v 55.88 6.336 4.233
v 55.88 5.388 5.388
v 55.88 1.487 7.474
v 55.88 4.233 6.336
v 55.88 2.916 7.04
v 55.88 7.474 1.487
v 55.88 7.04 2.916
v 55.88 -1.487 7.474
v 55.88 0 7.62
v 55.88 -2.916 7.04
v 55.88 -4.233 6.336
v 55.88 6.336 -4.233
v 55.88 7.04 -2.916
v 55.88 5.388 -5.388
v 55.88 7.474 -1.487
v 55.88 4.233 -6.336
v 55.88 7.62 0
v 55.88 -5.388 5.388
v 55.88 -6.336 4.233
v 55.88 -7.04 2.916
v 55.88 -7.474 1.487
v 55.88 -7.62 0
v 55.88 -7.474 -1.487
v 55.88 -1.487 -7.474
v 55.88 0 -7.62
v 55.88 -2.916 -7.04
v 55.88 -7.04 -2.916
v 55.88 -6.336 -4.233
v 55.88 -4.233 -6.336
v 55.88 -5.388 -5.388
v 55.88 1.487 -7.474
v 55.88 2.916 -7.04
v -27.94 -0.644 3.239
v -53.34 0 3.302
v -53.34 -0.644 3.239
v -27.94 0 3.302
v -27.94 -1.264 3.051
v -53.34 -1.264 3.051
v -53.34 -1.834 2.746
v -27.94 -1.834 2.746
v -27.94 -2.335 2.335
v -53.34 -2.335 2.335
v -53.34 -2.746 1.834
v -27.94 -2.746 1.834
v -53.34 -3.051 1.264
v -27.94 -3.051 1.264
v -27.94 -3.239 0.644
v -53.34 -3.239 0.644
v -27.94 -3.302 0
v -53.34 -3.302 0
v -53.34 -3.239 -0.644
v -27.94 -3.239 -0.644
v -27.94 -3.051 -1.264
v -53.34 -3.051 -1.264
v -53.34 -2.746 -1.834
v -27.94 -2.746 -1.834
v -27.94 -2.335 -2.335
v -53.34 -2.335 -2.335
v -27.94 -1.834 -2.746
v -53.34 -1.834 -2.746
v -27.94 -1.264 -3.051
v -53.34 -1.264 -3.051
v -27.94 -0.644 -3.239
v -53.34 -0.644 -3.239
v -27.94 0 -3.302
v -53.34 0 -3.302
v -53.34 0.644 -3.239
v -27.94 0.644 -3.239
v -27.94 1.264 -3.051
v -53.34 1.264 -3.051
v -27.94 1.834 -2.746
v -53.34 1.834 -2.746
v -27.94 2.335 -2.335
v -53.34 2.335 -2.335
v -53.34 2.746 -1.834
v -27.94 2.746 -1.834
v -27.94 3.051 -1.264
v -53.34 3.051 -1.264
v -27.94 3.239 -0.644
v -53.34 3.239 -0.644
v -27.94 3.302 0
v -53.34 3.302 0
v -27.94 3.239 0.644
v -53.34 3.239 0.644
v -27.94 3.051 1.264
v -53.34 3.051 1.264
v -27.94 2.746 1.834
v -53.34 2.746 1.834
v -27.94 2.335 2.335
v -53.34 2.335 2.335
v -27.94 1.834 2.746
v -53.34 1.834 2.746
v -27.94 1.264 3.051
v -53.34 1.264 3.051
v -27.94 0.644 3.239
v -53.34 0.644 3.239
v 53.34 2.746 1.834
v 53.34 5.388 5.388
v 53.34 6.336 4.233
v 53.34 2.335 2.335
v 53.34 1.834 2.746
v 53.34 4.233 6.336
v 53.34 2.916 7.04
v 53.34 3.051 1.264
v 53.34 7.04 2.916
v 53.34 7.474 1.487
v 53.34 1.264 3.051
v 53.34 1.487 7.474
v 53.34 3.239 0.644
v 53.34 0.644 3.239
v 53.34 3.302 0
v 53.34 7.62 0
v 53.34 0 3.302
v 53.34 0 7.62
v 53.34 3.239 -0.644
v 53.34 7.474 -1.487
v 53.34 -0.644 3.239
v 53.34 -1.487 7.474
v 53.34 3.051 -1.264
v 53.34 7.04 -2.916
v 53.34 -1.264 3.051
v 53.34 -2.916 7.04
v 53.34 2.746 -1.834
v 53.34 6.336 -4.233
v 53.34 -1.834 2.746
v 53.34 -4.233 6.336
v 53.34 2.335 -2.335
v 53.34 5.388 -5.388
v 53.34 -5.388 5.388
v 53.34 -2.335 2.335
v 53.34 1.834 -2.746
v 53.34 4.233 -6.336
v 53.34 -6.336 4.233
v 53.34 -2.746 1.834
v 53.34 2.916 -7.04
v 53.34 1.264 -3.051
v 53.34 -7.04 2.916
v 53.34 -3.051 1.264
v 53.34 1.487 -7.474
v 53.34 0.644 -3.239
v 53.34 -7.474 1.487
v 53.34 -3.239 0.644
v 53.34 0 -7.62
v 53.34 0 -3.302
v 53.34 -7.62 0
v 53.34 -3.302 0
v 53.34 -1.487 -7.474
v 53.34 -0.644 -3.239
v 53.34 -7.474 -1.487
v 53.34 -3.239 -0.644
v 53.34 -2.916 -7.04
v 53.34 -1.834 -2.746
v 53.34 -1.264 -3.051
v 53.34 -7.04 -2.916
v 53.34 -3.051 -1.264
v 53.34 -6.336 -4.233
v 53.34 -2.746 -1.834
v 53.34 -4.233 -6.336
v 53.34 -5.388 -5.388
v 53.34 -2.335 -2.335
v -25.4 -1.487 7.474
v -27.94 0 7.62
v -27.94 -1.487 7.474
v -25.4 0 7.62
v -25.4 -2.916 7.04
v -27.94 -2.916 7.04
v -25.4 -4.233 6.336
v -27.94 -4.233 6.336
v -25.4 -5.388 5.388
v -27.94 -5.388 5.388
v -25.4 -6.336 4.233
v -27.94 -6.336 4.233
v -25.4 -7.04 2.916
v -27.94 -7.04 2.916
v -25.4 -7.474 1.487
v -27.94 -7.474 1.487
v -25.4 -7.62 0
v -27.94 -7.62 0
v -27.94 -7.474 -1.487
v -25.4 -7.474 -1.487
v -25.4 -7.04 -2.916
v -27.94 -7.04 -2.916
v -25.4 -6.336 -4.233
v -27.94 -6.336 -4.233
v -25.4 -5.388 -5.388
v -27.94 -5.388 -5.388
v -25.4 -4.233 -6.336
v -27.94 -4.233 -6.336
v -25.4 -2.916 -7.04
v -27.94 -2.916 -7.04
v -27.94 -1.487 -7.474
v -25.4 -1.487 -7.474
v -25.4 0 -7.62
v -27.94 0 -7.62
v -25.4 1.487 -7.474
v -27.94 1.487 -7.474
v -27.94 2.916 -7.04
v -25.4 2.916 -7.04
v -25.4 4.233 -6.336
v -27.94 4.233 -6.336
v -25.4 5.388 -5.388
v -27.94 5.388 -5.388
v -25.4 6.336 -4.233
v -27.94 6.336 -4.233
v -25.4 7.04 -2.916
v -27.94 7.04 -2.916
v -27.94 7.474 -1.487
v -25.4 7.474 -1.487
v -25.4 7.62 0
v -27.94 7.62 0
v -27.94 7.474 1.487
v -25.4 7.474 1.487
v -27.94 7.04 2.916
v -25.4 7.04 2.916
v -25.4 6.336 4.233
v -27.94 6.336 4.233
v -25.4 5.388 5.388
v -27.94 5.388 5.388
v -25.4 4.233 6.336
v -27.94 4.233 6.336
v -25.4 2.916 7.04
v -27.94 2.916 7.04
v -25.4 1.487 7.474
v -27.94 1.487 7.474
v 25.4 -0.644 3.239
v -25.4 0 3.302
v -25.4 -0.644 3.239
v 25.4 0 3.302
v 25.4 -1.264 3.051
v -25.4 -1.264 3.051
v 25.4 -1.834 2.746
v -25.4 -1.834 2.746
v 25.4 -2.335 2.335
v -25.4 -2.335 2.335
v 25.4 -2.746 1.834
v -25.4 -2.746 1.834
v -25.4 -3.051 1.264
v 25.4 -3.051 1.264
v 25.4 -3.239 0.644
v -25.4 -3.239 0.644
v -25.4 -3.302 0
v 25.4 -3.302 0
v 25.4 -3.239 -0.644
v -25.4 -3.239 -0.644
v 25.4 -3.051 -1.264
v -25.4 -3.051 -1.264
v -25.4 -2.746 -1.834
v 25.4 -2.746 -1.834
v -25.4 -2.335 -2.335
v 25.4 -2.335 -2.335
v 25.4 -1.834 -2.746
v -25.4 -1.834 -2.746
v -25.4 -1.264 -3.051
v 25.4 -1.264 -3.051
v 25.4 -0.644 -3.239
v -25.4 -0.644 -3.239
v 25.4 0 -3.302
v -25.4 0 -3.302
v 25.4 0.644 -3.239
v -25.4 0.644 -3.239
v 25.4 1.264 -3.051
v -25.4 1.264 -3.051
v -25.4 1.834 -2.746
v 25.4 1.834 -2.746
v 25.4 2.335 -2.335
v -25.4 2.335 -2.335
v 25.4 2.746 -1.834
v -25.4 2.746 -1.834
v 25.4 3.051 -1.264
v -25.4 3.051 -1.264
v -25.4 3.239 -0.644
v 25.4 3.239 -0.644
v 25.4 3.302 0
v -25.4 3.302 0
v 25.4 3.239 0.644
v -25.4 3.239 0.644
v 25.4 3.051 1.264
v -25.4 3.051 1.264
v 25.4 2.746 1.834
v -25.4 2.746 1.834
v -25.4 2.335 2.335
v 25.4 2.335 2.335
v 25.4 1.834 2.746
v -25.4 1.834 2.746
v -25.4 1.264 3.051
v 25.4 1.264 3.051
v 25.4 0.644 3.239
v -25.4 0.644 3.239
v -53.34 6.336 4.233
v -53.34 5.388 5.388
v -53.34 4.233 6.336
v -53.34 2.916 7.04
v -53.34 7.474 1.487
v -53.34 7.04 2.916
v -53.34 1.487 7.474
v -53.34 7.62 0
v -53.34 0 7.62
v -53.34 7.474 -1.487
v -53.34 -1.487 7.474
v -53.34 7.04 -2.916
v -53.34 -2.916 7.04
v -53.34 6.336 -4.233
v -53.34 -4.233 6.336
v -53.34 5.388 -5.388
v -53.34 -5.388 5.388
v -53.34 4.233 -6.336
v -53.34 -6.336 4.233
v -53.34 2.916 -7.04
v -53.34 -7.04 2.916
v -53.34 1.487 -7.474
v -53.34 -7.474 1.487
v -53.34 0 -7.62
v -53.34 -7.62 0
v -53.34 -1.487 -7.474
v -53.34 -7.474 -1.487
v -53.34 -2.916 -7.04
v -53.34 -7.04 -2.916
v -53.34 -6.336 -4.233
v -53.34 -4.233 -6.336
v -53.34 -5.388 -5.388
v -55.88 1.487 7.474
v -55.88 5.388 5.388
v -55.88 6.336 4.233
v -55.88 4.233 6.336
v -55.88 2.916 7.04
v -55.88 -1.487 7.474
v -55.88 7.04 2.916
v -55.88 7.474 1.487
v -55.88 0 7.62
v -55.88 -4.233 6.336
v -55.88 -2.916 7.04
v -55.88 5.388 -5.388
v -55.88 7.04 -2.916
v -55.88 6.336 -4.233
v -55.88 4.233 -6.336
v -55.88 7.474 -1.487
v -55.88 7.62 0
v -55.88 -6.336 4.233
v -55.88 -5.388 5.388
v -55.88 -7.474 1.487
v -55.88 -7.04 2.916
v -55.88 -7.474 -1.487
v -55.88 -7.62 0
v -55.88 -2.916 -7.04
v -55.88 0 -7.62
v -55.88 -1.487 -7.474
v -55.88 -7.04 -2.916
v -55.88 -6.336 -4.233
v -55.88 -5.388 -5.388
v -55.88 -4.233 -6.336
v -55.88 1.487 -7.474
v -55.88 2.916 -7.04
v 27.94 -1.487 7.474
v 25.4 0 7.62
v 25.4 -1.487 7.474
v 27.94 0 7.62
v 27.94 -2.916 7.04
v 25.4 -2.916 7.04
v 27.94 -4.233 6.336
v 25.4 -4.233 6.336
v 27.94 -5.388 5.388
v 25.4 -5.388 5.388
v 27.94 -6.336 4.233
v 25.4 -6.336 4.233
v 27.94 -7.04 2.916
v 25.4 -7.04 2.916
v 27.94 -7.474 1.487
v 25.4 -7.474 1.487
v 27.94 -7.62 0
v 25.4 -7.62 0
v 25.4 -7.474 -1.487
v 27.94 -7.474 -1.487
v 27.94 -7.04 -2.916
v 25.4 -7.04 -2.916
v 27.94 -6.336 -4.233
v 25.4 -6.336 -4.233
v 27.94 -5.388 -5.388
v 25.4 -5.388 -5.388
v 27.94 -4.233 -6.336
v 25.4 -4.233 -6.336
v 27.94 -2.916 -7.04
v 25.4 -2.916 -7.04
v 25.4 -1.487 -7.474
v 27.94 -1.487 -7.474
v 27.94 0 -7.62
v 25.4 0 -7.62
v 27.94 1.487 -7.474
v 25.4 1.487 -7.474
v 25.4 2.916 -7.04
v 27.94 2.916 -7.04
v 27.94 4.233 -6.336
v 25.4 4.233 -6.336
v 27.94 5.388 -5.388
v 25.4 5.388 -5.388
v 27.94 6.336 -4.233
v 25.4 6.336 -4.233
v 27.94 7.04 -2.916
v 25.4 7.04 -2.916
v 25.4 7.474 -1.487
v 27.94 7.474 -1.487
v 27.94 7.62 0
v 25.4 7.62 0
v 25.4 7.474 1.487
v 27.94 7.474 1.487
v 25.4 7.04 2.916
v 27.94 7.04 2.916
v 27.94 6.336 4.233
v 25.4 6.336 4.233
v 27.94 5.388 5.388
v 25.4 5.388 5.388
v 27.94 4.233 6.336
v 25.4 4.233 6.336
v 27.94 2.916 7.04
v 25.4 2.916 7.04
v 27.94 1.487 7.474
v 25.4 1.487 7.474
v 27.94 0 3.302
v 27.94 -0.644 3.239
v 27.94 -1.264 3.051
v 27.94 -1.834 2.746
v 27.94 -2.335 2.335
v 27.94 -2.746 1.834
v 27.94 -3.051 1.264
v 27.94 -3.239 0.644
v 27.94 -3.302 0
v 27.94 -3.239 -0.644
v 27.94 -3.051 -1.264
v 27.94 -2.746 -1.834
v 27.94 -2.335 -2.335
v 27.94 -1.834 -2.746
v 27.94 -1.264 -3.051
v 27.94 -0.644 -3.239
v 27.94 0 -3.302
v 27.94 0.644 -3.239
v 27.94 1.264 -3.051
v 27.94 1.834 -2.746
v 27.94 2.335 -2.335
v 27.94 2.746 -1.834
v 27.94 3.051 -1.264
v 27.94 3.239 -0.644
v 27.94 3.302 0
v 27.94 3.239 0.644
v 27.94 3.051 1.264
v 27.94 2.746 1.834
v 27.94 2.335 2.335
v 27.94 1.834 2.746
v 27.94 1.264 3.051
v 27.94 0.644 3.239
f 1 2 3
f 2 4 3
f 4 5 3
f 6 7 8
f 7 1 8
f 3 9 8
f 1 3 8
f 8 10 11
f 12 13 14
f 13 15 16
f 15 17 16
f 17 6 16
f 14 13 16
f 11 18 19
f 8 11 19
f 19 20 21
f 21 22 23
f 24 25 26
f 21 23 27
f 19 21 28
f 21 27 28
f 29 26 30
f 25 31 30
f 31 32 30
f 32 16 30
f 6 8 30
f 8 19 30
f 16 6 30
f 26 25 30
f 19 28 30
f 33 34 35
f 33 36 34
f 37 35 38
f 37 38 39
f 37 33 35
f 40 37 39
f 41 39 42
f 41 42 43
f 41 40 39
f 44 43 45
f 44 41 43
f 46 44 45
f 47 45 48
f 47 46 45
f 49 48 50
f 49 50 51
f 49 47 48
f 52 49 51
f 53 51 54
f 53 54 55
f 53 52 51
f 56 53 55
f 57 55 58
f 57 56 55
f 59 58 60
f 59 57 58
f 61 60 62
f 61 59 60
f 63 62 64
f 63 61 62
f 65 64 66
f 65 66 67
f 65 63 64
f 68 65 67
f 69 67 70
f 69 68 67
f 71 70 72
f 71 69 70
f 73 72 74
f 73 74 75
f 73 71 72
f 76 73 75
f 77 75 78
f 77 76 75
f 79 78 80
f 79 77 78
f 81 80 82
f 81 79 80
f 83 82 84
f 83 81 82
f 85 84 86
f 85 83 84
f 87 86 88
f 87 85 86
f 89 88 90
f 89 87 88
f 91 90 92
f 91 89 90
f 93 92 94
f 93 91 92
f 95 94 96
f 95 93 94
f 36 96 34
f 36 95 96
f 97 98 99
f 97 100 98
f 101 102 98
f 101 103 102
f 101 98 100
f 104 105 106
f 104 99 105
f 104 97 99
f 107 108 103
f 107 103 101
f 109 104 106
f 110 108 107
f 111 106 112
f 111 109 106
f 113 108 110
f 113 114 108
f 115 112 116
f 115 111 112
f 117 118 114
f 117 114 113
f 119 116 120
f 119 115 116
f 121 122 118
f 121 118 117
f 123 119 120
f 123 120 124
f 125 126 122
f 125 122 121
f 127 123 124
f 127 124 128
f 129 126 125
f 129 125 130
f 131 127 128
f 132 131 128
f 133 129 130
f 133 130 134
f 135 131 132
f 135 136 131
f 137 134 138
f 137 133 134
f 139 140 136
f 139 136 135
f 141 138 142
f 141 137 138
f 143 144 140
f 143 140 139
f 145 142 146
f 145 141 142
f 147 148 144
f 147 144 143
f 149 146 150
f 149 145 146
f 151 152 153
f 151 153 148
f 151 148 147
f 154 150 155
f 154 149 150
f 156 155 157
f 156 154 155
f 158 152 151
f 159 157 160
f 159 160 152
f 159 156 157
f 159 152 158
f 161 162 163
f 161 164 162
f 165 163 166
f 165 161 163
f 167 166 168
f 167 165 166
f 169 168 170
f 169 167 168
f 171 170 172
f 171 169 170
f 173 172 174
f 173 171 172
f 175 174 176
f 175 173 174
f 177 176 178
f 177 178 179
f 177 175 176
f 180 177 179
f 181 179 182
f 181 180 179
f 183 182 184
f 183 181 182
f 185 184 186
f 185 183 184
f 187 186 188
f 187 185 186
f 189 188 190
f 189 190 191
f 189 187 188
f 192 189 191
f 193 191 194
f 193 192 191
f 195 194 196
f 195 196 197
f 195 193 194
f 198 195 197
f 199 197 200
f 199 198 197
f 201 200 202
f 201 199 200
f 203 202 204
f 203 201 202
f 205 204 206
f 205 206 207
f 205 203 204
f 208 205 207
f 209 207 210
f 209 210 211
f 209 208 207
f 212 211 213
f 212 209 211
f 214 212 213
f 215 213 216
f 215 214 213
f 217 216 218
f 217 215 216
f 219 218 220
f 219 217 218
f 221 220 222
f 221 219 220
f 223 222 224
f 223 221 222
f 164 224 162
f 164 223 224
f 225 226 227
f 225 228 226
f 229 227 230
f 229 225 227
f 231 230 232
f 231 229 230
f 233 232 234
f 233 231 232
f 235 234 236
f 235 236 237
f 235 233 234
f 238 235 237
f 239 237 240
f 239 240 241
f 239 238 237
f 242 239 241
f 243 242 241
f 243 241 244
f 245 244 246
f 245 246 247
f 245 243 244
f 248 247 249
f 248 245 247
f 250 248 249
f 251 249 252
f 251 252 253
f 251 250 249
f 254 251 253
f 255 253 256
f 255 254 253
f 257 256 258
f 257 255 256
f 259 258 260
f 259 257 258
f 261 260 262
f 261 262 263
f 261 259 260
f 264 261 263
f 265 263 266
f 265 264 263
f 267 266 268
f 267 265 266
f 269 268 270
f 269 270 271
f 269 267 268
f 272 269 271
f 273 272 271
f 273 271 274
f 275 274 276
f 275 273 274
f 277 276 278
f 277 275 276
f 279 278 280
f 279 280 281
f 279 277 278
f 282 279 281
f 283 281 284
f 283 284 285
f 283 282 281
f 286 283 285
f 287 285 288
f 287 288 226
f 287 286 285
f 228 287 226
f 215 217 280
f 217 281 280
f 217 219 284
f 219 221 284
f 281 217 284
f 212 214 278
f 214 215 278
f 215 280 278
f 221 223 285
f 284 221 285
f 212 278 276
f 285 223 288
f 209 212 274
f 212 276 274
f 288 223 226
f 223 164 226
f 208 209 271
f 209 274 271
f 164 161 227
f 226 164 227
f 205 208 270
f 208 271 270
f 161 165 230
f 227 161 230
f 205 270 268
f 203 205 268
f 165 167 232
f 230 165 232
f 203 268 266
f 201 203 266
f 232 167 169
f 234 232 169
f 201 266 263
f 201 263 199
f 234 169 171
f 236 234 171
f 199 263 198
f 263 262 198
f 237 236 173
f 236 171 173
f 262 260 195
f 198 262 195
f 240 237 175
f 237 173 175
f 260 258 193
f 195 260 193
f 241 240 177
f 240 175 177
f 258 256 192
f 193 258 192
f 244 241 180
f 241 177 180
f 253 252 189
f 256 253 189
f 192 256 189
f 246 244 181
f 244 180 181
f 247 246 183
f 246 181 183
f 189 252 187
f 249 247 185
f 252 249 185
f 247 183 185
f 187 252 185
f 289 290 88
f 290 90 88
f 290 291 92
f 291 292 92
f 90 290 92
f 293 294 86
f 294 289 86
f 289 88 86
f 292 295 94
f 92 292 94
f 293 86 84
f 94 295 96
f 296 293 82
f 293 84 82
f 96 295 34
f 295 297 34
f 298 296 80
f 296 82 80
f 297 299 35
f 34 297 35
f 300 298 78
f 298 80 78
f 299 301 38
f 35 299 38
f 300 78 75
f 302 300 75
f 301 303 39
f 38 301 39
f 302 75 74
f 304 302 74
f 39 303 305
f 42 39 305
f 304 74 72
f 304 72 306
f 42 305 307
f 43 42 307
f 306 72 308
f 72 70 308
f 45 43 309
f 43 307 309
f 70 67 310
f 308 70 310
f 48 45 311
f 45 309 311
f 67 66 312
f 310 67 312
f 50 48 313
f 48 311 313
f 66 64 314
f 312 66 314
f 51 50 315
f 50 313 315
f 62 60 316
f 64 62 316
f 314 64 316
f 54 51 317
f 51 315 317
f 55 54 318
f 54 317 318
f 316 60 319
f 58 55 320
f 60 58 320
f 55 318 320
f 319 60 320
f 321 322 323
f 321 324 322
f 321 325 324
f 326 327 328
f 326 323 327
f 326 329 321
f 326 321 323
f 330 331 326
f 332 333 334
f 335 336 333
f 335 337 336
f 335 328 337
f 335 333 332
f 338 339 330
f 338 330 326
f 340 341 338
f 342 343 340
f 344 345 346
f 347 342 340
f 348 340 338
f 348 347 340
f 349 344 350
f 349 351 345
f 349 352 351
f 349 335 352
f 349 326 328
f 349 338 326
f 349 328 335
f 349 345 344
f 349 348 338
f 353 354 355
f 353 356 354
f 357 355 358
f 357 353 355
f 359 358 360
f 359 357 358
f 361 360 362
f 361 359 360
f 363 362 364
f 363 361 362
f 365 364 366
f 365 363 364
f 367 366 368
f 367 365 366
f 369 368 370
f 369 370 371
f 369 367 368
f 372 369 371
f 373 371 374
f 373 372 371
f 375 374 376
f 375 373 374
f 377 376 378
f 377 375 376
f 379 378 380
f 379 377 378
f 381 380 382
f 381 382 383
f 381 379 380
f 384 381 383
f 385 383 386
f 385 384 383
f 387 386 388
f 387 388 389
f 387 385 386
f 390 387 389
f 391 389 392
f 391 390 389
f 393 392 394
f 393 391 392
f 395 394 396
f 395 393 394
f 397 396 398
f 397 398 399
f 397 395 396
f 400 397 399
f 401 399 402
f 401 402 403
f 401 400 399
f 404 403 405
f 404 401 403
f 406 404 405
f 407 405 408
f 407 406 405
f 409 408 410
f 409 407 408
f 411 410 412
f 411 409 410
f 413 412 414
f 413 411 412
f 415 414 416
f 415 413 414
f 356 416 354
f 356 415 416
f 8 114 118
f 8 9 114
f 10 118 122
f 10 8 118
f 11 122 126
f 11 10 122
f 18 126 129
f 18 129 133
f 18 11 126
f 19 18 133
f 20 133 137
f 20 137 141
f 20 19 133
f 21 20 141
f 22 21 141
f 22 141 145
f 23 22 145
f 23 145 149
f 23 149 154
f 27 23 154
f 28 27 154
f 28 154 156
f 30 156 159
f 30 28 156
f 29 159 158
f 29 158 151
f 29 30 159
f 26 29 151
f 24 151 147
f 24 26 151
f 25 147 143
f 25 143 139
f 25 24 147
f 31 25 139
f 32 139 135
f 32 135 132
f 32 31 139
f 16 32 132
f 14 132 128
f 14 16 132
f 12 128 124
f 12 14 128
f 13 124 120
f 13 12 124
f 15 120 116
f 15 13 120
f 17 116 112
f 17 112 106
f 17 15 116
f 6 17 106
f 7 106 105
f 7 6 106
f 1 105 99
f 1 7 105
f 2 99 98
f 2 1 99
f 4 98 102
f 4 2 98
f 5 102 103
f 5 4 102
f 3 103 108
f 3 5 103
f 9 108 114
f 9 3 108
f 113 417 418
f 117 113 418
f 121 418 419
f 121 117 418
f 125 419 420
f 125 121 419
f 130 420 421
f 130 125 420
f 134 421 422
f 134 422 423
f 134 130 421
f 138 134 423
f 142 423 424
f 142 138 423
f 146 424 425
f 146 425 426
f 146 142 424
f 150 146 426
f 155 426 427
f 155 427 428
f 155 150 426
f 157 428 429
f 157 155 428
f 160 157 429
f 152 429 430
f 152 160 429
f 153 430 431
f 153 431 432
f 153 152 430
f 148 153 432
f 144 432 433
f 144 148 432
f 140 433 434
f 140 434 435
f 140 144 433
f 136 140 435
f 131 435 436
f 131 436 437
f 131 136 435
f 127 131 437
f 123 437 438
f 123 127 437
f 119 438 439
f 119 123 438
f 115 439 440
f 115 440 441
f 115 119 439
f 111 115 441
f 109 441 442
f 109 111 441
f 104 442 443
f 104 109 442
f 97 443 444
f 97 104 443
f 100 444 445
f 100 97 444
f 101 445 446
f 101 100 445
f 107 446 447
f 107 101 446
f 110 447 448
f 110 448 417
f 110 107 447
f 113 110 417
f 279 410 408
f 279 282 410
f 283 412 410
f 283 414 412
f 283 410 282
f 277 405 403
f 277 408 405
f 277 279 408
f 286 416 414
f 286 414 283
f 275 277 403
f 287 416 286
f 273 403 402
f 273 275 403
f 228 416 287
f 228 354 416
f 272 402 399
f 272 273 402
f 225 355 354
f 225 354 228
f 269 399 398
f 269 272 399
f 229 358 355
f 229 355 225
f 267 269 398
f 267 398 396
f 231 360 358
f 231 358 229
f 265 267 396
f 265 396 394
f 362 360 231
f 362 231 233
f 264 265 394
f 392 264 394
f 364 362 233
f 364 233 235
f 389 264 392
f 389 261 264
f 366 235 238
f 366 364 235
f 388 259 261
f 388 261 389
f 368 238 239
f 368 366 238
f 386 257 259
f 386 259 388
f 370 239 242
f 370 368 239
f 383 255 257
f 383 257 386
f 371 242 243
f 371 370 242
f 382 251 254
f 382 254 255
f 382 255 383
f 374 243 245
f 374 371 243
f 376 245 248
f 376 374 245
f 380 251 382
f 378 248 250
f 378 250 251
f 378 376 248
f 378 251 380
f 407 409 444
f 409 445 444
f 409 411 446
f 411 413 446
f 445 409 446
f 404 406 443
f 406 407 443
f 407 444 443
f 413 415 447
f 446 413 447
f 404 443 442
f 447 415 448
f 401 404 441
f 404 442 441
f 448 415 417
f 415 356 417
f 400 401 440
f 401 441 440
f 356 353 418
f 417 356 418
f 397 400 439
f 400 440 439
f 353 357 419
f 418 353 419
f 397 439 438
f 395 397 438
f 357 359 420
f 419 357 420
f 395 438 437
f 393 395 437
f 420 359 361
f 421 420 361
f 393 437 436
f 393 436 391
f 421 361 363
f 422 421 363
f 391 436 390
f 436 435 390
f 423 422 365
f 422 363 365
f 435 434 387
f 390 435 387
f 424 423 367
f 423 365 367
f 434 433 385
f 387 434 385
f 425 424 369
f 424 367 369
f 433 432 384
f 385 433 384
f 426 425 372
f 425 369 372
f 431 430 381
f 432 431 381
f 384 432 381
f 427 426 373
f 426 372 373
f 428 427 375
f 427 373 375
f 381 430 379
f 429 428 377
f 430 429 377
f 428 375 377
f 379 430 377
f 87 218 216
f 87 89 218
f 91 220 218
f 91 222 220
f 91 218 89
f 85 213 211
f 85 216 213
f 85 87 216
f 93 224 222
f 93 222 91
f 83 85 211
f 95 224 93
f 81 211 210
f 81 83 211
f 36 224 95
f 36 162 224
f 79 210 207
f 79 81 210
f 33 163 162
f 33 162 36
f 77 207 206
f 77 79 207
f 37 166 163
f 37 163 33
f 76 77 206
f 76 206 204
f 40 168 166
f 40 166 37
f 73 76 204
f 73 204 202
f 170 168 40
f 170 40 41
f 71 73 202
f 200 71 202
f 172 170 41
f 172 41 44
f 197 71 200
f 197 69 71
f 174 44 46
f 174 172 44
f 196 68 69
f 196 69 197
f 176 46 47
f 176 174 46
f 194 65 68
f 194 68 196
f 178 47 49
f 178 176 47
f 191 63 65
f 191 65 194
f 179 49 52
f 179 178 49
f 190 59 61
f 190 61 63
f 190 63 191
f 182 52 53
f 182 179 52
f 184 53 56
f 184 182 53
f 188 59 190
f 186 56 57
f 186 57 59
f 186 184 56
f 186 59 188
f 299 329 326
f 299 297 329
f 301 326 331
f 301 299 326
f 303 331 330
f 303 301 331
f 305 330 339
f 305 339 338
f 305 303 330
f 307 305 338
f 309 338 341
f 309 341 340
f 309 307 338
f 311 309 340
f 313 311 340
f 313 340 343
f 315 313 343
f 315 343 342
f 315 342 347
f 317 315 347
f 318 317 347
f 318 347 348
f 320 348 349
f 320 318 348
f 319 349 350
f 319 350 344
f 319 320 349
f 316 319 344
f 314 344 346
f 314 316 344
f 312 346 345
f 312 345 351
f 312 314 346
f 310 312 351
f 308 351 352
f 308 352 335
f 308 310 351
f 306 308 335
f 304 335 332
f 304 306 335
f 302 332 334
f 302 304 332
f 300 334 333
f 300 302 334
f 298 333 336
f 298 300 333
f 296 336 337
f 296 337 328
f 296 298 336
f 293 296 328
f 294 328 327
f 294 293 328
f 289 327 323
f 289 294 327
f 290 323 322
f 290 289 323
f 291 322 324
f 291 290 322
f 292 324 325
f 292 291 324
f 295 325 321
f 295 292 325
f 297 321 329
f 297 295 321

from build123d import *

# Parameters (mm, degrees)
SKETCH1_W = 111.76
SKETCH1_H = 3.302
SKETCH6_W = 2.54
SKETCH6_H = 4.318


with BuildPart() as part:
    # Sketch1 → Revolve1 (revolve)
    with BuildSketch(Plane.XY, mode=Mode.PRIVATE) as revolve1_sk:
        with Locations((0, 1.651)):
            Rectangle(SKETCH1_W, SKETCH1_H)
    revolve(revolve1_sk.sketch.rotate(Axis((-55.88, 0, 0), (1, 0, 0)), 90), axis=Axis((-55.88, 0, 0), (1, 0, 0)))

    # Sketch6 → Revolve2 (revolve)
    with BuildSketch(Plane.XY, mode=Mode.PRIVATE) as revolve2_sk:
        with Locations((-26.67, 5.461)):
            Rectangle(SKETCH6_W, SKETCH6_H)
        with Locations((26.67, 5.461)):
            Rectangle(SKETCH6_W, SKETCH6_H)
        with Locations((-54.61, 5.461)):
            Rectangle(SKETCH6_W, SKETCH6_H)
        with Locations((54.61, 5.461)):
            Rectangle(SKETCH6_W, SKETCH6_H)
    revolve(revolve2_sk.sketch.rotate(Axis((-31.878421892, 0, 0), (1, 0, 0)), 90), axis=Axis((-31.878421892, 0, 0), (1, 0, 0)))


solid = part.part
